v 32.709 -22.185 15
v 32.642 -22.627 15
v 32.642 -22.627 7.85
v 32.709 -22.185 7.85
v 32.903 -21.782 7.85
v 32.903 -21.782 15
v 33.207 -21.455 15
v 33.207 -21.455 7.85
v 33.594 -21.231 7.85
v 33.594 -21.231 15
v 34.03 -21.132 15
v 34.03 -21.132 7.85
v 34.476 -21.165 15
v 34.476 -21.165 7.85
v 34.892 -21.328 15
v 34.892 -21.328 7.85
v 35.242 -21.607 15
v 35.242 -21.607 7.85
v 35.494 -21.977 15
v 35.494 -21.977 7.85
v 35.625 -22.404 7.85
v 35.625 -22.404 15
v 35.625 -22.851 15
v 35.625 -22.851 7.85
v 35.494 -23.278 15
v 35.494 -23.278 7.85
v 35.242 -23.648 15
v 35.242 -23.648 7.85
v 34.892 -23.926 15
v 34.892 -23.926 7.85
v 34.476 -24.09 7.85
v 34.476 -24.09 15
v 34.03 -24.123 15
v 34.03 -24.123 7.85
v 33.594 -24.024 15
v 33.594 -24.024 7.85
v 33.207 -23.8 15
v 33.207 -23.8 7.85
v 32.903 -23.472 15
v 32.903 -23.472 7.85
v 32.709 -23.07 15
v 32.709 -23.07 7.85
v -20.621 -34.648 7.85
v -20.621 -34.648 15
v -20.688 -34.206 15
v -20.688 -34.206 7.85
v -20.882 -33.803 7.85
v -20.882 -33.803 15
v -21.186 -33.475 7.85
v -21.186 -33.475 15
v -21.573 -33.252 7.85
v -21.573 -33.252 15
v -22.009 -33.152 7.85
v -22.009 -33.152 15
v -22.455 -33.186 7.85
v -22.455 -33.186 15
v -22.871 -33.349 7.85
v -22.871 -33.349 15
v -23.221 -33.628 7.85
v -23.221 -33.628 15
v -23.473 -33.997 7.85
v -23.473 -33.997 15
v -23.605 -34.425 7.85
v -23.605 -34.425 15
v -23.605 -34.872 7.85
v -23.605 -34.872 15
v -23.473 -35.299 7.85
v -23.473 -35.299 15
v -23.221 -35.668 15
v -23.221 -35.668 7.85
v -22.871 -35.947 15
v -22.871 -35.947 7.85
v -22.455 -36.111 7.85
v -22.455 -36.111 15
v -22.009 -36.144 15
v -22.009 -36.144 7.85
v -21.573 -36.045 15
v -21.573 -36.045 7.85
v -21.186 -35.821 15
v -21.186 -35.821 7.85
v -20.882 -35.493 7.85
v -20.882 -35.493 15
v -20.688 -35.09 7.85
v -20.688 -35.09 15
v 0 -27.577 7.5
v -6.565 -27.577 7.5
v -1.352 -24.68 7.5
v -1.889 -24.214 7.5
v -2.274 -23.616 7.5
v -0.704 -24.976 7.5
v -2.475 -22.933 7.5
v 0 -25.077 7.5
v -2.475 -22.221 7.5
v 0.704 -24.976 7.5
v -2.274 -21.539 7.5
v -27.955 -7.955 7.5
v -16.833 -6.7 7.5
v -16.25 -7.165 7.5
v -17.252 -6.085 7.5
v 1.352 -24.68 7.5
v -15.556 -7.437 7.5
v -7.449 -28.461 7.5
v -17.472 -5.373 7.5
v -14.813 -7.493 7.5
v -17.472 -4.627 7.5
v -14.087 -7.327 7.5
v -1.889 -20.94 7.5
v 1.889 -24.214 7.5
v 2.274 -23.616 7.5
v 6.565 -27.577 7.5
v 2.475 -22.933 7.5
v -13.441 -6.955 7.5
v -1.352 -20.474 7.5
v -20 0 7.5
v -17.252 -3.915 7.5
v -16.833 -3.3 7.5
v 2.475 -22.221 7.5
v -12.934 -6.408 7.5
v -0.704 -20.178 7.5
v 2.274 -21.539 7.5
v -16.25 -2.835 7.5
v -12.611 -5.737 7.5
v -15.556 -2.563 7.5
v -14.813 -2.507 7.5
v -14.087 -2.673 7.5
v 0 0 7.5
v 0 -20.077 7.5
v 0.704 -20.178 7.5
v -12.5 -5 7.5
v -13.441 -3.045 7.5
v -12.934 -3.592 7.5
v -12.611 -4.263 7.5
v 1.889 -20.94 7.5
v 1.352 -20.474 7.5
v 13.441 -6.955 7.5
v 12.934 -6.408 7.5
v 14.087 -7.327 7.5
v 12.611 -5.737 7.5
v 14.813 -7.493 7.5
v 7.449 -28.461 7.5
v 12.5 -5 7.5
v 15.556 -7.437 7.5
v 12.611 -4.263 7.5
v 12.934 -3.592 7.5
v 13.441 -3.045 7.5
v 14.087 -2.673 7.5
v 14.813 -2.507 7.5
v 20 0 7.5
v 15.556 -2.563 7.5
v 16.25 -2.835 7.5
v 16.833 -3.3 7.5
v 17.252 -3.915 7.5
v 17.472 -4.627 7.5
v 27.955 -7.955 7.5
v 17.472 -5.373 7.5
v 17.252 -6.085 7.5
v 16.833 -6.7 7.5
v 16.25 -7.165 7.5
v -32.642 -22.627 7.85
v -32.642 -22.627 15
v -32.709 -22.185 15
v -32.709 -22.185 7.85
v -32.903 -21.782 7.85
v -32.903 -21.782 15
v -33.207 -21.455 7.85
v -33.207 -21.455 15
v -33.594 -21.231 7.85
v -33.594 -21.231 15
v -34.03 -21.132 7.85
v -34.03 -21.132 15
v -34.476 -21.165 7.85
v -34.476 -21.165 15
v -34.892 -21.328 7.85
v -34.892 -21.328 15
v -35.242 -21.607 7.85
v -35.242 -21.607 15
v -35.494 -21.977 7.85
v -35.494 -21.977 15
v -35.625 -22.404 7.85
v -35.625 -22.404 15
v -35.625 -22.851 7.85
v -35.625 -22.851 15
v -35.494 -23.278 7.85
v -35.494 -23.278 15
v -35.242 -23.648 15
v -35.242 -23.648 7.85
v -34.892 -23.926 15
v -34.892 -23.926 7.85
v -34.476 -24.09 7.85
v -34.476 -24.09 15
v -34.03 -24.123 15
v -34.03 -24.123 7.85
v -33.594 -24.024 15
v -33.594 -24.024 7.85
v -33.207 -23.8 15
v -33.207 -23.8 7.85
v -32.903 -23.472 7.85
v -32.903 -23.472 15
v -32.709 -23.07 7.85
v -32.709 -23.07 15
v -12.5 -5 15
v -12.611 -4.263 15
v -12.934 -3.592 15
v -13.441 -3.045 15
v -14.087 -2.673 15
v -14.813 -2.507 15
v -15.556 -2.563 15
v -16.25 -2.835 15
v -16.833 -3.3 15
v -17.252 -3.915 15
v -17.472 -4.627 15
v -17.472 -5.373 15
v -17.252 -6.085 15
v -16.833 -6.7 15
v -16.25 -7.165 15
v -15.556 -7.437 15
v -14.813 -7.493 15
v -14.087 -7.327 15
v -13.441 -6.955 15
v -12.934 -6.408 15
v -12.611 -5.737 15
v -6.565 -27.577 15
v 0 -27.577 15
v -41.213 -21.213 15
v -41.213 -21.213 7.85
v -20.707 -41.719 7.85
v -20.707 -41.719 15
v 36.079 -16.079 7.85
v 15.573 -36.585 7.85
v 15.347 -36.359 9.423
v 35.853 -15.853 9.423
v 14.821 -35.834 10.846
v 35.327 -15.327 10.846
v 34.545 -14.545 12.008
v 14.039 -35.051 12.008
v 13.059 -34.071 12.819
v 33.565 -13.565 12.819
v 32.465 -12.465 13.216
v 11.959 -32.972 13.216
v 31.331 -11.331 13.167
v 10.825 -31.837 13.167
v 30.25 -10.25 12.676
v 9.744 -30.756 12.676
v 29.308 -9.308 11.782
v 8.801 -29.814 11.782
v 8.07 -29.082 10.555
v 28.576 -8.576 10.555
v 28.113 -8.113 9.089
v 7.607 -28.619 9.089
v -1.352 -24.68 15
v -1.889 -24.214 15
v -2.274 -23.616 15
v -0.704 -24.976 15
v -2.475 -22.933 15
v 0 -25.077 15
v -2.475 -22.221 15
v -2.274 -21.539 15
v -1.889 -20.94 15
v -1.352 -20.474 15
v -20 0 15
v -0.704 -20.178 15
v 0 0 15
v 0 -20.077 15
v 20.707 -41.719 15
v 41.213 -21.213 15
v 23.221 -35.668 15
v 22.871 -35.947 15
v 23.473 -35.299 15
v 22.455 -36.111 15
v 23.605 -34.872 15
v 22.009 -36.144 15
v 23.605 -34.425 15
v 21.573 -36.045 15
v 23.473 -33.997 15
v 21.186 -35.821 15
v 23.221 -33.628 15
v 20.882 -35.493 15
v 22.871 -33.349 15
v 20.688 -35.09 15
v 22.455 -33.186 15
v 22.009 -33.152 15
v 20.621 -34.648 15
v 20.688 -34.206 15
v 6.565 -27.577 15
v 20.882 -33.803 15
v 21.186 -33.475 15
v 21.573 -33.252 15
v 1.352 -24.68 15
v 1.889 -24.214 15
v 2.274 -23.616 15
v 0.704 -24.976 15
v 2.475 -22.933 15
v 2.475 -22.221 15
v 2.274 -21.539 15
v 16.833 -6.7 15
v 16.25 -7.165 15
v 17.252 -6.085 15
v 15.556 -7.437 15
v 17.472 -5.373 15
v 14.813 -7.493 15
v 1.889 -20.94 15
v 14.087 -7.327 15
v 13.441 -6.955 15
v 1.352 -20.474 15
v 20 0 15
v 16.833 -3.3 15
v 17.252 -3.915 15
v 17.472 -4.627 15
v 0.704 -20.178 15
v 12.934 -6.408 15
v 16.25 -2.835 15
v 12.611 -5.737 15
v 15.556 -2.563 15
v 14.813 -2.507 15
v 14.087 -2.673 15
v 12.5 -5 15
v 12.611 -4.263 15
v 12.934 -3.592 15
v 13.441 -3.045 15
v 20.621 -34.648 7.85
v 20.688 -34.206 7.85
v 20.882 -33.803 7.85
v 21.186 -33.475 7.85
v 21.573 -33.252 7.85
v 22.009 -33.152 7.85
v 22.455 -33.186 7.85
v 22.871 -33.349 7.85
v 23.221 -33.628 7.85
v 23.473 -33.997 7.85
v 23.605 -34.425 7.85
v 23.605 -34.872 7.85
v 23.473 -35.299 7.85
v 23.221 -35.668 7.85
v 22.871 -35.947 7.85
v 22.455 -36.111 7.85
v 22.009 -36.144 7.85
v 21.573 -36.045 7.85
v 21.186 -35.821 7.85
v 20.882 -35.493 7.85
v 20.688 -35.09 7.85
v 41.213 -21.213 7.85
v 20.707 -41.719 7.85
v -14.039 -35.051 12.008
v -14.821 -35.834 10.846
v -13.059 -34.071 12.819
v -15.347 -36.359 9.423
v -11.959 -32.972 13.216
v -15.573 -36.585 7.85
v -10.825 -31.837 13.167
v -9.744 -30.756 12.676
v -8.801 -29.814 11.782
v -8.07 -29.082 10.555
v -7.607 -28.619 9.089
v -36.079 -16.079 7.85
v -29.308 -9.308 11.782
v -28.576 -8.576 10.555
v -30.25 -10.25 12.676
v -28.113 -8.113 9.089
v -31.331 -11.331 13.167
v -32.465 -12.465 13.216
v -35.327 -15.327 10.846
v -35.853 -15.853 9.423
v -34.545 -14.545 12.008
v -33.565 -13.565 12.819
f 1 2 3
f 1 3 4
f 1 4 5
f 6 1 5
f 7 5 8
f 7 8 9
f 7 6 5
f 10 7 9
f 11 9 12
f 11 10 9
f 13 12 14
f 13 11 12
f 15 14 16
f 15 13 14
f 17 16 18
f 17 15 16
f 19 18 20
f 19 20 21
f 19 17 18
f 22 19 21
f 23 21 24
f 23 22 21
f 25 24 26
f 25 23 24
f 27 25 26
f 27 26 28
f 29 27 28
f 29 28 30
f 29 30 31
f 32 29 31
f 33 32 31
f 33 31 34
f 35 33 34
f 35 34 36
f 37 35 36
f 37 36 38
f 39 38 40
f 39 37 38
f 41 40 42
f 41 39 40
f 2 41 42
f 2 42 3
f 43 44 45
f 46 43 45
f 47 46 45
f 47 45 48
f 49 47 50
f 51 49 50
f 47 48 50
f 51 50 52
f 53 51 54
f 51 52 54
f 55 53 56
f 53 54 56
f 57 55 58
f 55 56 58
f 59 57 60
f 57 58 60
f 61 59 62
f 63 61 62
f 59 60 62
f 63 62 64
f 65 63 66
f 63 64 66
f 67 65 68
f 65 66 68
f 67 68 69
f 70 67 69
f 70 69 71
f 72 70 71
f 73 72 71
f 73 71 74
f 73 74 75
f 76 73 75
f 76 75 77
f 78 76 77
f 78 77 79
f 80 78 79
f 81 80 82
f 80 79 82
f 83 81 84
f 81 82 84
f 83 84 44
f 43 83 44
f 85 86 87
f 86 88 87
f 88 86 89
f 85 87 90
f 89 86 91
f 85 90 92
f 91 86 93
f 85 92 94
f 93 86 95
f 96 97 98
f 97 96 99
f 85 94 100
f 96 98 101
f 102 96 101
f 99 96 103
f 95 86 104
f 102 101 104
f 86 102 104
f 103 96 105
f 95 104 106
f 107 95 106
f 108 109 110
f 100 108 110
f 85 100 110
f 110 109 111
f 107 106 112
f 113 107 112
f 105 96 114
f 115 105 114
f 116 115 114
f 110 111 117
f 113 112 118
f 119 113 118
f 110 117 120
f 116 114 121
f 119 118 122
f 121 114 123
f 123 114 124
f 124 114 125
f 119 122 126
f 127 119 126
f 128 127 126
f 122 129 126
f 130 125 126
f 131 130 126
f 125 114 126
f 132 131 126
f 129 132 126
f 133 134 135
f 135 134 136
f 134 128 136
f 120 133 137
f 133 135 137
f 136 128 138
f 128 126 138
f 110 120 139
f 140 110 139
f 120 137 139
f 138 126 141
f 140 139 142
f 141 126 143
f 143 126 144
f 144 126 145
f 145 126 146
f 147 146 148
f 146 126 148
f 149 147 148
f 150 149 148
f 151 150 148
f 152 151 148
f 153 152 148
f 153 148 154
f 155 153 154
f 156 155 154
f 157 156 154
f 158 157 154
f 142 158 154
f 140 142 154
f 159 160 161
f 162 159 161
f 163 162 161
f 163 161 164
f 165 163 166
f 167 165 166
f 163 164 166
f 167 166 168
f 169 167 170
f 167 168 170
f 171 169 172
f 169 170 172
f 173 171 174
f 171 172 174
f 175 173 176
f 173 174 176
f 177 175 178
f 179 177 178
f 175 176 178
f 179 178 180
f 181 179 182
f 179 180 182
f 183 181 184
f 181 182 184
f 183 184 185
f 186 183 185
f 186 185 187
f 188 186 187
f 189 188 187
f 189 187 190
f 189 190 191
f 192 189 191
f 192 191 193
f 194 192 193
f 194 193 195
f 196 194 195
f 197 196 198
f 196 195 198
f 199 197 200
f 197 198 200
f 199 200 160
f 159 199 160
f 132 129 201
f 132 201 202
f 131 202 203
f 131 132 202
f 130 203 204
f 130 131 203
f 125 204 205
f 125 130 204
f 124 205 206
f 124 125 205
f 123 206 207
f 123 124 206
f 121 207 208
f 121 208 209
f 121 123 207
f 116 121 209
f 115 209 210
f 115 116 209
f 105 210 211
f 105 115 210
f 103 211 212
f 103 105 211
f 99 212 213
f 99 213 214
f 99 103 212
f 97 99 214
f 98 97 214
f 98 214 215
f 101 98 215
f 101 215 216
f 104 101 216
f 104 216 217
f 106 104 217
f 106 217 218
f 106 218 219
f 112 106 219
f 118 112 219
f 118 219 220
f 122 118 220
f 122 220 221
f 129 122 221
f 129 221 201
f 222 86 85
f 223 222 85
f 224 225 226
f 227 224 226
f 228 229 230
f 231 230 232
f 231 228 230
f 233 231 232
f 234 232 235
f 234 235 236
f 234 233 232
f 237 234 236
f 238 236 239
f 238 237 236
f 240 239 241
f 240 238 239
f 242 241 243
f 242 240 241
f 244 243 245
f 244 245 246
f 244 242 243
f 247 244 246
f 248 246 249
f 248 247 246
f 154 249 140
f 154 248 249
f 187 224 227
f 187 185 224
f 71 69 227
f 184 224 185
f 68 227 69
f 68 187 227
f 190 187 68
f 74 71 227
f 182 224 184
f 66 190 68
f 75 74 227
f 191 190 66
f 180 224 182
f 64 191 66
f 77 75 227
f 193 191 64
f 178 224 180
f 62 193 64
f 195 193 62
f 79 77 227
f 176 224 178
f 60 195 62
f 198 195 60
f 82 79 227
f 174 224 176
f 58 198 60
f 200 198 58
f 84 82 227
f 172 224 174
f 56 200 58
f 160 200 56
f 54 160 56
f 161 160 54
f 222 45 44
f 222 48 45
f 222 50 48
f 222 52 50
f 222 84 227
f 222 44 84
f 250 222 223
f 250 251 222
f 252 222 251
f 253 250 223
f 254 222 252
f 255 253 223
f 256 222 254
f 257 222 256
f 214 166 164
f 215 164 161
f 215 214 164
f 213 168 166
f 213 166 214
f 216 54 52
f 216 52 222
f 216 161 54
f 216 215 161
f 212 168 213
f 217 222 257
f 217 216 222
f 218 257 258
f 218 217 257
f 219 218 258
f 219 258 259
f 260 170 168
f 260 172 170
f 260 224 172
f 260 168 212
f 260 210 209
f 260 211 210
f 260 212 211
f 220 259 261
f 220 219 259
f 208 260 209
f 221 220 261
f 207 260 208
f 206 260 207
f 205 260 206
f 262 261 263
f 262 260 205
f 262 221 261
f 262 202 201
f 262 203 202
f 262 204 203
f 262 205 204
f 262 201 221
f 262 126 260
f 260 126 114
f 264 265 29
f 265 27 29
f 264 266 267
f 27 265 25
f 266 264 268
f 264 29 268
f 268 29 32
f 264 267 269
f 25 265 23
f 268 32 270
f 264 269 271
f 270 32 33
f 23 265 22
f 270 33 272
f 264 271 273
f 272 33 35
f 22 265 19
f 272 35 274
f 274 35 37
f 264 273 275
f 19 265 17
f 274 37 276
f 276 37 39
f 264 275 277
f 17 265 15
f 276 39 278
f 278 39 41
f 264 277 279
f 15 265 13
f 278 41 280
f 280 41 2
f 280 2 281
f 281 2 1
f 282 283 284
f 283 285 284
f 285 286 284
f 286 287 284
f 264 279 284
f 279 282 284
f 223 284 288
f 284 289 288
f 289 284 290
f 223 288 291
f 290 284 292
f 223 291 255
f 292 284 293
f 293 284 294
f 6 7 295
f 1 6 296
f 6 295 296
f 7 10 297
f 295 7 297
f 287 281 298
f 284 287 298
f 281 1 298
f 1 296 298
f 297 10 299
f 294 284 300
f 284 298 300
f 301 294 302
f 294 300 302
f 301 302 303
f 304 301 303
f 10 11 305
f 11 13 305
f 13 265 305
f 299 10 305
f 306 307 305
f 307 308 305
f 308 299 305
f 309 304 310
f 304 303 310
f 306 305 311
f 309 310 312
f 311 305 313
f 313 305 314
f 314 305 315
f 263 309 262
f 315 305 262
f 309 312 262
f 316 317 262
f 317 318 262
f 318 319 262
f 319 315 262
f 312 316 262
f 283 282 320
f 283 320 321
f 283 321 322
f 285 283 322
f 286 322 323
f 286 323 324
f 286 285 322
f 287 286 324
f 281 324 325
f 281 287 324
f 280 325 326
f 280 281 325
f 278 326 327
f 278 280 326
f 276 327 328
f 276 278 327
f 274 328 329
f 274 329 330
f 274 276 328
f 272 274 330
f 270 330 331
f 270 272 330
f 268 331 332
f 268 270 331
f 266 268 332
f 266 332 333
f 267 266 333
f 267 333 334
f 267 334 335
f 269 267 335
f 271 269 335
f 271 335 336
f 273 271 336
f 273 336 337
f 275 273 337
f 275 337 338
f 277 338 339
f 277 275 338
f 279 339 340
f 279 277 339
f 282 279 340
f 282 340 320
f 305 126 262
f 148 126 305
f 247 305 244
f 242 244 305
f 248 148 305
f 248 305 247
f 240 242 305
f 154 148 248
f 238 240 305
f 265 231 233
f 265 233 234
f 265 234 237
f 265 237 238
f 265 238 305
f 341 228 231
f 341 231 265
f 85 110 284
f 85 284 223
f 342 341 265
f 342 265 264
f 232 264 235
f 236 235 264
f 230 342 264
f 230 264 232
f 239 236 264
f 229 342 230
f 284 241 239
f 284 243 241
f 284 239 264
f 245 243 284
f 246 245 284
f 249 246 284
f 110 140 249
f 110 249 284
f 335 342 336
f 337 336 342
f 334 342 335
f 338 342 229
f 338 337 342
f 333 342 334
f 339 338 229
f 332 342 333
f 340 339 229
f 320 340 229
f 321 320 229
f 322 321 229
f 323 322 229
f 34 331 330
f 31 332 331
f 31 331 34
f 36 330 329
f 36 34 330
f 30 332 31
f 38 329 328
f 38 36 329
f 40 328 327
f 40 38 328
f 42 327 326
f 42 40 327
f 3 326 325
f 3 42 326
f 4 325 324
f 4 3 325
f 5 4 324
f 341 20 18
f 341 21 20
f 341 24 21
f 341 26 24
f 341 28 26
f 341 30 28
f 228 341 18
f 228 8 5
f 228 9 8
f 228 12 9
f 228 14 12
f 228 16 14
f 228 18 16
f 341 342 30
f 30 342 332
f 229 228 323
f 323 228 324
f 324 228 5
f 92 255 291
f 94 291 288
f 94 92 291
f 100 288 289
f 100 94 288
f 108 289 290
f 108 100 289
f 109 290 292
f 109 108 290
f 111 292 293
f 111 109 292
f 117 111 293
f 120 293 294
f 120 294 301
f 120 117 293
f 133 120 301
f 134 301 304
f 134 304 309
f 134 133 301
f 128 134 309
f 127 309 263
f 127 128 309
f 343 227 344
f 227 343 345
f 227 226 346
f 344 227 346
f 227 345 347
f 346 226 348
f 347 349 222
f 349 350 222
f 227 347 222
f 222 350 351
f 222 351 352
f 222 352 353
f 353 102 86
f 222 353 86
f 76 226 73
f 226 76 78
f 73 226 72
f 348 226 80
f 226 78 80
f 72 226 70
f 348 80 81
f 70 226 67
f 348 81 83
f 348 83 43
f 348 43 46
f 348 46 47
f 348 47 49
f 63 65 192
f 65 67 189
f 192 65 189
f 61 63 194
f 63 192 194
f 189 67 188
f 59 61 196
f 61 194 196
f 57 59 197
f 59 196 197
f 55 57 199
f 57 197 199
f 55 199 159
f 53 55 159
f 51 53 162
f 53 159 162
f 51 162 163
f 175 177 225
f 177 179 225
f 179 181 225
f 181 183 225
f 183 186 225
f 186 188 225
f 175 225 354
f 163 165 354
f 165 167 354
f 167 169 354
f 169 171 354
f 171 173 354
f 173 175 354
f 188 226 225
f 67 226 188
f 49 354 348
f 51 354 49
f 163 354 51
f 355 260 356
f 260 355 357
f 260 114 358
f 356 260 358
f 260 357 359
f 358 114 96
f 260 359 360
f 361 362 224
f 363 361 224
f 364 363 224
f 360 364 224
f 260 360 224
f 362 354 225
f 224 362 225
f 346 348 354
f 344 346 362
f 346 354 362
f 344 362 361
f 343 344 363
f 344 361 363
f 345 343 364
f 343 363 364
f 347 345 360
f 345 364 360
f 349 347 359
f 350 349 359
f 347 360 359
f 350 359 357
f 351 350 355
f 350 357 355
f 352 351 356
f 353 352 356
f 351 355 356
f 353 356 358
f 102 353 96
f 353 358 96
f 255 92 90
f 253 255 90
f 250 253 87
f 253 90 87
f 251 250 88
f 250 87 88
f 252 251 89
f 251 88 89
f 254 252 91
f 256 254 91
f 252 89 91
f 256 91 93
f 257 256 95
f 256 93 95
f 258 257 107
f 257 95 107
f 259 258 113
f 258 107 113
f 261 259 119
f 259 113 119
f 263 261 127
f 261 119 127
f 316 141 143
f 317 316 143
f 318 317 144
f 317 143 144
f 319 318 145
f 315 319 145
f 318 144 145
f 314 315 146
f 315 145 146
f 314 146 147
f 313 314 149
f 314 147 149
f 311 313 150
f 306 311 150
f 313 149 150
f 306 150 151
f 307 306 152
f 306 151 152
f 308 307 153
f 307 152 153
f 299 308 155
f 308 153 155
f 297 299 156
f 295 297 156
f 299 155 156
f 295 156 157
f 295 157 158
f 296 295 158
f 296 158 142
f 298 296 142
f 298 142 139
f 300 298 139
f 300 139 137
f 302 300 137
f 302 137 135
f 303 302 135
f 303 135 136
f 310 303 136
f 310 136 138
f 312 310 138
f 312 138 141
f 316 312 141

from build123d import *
from build123d import SkipClean  # not in build123d's __all__

# Parameters (mm, degrees)
F0_R      = 2.5
F1_DEPTH  = 15
F3_DEPTH  = 29
F4_R      = 1.5
F5_DEPTH  = 7.15
F6_R      = 1
F7_DEPTH  = 7.15
F10_DEPTH = 55


with BuildPart() as f1:
    # F0 (on Top) → F1 (new body)
    with BuildSketch(Plane.XY):
        with BuildLine():
            Line((0, 0), (-20, 0))
            Line((-20, 0), (-41.2132034356, -21.2132034356))
            Line((-41.2132034356, -21.2132034356), (-20.7071067812, -41.71930009))
            Line((-20.7071067812, -41.71930009), (-6.5649711575, -27.5771644663))
            Line((-6.5649711575, -27.5771644663), (0, -27.5771644663))
            Line((0, -27.5771644663), (0, -25.0771644663))
            ThreePointArc((0, -25.0771644663), (-2.5, -22.5771644663), (0, -20.0771644663))
            Line((0, -20.0771644663), (0, 0))
        make_face()
        with Locations((-15, -5)):
            Circle(F0_R, mode=Mode.SUBTRACT)
    extrude(amount=F1_DEPTH)

    # F2 (on face) → F3 (cut, through all)
    with BuildSketch(Plane(origin=(-10, 10, 0), x_dir=(-0.7071067812, -0.7071067812, 0), z_dir=(-0.7071067812, 0.7071067812, 0))):
        with BuildLine():
            Line((44.1421356237, 7.85), (36.8814735646, 7.85))
            ThreePointArc((36.8814735646, 7.85), (25.3921356237, 7.5), (36.8814735646, 7.15))
            Line((36.8814735646, 7.15), (44.1421356237, 7.15))
            Line((44.1421356237, 7.15), (44.1421356237, 7.85))
        make_face()
    extrude(amount=-F3_DEPTH, mode=Mode.SUBTRACT)

    # F4 (on face) → F5 (cut, through all)
    with BuildSketch(Plane.XY.offset(15)):
        with Locations((-34.1421356237, -22.627416998)):
            Circle(F4_R)
        with Locations((-22.1213203436, -34.6482322781)):
            Circle(F4_R)
    extrude(amount=-F5_DEPTH, mode=Mode.SUBTRACT)

    # F6 (on face) → F7 (cut, through all)
    with BuildSketch(Plane(origin=(0, 0, 0), x_dir=(1, 0, 0), z_dir=(0, 0, -1))):
        with Locations((-22.1213203436, 34.6482322781)):
            Circle(F6_R)
        with Locations((-34.1421356237, 22.627416998)):
            Circle(F6_R)
    extrude(amount=-F7_DEPTH, mode=Mode.SUBTRACT)

    # F8: F1 across plane


with BuildPart() as f1_1:
    add(f1.part, clean=False)
    with SkipClean():  # cleaning this boolean's faces spoils the solid; the shape is the same uncleaned
        add(f1.part.mirror(Plane.YZ), clean=False)

    # F9 (on face) → F10 (cut)
    with BuildSketch(Plane(origin=(0, 0, 0), x_dir=(-1, 0, 0), z_dir=(0, 1, 0))):
        Polygon((47.4618822336, 7.5), (-20, 7.5), (-48.8657653332, 7.5), (-48.8657653332, -7.0414701477), (47.4618822336, -7.0414701477), align=None)
    with SkipClean():  # cleaning this boolean's faces spoils the solid; the shape is the same uncleaned
        extrude(amount=-F10_DEPTH, mode=Mode.SUBTRACT)


solid = f1_1.part
